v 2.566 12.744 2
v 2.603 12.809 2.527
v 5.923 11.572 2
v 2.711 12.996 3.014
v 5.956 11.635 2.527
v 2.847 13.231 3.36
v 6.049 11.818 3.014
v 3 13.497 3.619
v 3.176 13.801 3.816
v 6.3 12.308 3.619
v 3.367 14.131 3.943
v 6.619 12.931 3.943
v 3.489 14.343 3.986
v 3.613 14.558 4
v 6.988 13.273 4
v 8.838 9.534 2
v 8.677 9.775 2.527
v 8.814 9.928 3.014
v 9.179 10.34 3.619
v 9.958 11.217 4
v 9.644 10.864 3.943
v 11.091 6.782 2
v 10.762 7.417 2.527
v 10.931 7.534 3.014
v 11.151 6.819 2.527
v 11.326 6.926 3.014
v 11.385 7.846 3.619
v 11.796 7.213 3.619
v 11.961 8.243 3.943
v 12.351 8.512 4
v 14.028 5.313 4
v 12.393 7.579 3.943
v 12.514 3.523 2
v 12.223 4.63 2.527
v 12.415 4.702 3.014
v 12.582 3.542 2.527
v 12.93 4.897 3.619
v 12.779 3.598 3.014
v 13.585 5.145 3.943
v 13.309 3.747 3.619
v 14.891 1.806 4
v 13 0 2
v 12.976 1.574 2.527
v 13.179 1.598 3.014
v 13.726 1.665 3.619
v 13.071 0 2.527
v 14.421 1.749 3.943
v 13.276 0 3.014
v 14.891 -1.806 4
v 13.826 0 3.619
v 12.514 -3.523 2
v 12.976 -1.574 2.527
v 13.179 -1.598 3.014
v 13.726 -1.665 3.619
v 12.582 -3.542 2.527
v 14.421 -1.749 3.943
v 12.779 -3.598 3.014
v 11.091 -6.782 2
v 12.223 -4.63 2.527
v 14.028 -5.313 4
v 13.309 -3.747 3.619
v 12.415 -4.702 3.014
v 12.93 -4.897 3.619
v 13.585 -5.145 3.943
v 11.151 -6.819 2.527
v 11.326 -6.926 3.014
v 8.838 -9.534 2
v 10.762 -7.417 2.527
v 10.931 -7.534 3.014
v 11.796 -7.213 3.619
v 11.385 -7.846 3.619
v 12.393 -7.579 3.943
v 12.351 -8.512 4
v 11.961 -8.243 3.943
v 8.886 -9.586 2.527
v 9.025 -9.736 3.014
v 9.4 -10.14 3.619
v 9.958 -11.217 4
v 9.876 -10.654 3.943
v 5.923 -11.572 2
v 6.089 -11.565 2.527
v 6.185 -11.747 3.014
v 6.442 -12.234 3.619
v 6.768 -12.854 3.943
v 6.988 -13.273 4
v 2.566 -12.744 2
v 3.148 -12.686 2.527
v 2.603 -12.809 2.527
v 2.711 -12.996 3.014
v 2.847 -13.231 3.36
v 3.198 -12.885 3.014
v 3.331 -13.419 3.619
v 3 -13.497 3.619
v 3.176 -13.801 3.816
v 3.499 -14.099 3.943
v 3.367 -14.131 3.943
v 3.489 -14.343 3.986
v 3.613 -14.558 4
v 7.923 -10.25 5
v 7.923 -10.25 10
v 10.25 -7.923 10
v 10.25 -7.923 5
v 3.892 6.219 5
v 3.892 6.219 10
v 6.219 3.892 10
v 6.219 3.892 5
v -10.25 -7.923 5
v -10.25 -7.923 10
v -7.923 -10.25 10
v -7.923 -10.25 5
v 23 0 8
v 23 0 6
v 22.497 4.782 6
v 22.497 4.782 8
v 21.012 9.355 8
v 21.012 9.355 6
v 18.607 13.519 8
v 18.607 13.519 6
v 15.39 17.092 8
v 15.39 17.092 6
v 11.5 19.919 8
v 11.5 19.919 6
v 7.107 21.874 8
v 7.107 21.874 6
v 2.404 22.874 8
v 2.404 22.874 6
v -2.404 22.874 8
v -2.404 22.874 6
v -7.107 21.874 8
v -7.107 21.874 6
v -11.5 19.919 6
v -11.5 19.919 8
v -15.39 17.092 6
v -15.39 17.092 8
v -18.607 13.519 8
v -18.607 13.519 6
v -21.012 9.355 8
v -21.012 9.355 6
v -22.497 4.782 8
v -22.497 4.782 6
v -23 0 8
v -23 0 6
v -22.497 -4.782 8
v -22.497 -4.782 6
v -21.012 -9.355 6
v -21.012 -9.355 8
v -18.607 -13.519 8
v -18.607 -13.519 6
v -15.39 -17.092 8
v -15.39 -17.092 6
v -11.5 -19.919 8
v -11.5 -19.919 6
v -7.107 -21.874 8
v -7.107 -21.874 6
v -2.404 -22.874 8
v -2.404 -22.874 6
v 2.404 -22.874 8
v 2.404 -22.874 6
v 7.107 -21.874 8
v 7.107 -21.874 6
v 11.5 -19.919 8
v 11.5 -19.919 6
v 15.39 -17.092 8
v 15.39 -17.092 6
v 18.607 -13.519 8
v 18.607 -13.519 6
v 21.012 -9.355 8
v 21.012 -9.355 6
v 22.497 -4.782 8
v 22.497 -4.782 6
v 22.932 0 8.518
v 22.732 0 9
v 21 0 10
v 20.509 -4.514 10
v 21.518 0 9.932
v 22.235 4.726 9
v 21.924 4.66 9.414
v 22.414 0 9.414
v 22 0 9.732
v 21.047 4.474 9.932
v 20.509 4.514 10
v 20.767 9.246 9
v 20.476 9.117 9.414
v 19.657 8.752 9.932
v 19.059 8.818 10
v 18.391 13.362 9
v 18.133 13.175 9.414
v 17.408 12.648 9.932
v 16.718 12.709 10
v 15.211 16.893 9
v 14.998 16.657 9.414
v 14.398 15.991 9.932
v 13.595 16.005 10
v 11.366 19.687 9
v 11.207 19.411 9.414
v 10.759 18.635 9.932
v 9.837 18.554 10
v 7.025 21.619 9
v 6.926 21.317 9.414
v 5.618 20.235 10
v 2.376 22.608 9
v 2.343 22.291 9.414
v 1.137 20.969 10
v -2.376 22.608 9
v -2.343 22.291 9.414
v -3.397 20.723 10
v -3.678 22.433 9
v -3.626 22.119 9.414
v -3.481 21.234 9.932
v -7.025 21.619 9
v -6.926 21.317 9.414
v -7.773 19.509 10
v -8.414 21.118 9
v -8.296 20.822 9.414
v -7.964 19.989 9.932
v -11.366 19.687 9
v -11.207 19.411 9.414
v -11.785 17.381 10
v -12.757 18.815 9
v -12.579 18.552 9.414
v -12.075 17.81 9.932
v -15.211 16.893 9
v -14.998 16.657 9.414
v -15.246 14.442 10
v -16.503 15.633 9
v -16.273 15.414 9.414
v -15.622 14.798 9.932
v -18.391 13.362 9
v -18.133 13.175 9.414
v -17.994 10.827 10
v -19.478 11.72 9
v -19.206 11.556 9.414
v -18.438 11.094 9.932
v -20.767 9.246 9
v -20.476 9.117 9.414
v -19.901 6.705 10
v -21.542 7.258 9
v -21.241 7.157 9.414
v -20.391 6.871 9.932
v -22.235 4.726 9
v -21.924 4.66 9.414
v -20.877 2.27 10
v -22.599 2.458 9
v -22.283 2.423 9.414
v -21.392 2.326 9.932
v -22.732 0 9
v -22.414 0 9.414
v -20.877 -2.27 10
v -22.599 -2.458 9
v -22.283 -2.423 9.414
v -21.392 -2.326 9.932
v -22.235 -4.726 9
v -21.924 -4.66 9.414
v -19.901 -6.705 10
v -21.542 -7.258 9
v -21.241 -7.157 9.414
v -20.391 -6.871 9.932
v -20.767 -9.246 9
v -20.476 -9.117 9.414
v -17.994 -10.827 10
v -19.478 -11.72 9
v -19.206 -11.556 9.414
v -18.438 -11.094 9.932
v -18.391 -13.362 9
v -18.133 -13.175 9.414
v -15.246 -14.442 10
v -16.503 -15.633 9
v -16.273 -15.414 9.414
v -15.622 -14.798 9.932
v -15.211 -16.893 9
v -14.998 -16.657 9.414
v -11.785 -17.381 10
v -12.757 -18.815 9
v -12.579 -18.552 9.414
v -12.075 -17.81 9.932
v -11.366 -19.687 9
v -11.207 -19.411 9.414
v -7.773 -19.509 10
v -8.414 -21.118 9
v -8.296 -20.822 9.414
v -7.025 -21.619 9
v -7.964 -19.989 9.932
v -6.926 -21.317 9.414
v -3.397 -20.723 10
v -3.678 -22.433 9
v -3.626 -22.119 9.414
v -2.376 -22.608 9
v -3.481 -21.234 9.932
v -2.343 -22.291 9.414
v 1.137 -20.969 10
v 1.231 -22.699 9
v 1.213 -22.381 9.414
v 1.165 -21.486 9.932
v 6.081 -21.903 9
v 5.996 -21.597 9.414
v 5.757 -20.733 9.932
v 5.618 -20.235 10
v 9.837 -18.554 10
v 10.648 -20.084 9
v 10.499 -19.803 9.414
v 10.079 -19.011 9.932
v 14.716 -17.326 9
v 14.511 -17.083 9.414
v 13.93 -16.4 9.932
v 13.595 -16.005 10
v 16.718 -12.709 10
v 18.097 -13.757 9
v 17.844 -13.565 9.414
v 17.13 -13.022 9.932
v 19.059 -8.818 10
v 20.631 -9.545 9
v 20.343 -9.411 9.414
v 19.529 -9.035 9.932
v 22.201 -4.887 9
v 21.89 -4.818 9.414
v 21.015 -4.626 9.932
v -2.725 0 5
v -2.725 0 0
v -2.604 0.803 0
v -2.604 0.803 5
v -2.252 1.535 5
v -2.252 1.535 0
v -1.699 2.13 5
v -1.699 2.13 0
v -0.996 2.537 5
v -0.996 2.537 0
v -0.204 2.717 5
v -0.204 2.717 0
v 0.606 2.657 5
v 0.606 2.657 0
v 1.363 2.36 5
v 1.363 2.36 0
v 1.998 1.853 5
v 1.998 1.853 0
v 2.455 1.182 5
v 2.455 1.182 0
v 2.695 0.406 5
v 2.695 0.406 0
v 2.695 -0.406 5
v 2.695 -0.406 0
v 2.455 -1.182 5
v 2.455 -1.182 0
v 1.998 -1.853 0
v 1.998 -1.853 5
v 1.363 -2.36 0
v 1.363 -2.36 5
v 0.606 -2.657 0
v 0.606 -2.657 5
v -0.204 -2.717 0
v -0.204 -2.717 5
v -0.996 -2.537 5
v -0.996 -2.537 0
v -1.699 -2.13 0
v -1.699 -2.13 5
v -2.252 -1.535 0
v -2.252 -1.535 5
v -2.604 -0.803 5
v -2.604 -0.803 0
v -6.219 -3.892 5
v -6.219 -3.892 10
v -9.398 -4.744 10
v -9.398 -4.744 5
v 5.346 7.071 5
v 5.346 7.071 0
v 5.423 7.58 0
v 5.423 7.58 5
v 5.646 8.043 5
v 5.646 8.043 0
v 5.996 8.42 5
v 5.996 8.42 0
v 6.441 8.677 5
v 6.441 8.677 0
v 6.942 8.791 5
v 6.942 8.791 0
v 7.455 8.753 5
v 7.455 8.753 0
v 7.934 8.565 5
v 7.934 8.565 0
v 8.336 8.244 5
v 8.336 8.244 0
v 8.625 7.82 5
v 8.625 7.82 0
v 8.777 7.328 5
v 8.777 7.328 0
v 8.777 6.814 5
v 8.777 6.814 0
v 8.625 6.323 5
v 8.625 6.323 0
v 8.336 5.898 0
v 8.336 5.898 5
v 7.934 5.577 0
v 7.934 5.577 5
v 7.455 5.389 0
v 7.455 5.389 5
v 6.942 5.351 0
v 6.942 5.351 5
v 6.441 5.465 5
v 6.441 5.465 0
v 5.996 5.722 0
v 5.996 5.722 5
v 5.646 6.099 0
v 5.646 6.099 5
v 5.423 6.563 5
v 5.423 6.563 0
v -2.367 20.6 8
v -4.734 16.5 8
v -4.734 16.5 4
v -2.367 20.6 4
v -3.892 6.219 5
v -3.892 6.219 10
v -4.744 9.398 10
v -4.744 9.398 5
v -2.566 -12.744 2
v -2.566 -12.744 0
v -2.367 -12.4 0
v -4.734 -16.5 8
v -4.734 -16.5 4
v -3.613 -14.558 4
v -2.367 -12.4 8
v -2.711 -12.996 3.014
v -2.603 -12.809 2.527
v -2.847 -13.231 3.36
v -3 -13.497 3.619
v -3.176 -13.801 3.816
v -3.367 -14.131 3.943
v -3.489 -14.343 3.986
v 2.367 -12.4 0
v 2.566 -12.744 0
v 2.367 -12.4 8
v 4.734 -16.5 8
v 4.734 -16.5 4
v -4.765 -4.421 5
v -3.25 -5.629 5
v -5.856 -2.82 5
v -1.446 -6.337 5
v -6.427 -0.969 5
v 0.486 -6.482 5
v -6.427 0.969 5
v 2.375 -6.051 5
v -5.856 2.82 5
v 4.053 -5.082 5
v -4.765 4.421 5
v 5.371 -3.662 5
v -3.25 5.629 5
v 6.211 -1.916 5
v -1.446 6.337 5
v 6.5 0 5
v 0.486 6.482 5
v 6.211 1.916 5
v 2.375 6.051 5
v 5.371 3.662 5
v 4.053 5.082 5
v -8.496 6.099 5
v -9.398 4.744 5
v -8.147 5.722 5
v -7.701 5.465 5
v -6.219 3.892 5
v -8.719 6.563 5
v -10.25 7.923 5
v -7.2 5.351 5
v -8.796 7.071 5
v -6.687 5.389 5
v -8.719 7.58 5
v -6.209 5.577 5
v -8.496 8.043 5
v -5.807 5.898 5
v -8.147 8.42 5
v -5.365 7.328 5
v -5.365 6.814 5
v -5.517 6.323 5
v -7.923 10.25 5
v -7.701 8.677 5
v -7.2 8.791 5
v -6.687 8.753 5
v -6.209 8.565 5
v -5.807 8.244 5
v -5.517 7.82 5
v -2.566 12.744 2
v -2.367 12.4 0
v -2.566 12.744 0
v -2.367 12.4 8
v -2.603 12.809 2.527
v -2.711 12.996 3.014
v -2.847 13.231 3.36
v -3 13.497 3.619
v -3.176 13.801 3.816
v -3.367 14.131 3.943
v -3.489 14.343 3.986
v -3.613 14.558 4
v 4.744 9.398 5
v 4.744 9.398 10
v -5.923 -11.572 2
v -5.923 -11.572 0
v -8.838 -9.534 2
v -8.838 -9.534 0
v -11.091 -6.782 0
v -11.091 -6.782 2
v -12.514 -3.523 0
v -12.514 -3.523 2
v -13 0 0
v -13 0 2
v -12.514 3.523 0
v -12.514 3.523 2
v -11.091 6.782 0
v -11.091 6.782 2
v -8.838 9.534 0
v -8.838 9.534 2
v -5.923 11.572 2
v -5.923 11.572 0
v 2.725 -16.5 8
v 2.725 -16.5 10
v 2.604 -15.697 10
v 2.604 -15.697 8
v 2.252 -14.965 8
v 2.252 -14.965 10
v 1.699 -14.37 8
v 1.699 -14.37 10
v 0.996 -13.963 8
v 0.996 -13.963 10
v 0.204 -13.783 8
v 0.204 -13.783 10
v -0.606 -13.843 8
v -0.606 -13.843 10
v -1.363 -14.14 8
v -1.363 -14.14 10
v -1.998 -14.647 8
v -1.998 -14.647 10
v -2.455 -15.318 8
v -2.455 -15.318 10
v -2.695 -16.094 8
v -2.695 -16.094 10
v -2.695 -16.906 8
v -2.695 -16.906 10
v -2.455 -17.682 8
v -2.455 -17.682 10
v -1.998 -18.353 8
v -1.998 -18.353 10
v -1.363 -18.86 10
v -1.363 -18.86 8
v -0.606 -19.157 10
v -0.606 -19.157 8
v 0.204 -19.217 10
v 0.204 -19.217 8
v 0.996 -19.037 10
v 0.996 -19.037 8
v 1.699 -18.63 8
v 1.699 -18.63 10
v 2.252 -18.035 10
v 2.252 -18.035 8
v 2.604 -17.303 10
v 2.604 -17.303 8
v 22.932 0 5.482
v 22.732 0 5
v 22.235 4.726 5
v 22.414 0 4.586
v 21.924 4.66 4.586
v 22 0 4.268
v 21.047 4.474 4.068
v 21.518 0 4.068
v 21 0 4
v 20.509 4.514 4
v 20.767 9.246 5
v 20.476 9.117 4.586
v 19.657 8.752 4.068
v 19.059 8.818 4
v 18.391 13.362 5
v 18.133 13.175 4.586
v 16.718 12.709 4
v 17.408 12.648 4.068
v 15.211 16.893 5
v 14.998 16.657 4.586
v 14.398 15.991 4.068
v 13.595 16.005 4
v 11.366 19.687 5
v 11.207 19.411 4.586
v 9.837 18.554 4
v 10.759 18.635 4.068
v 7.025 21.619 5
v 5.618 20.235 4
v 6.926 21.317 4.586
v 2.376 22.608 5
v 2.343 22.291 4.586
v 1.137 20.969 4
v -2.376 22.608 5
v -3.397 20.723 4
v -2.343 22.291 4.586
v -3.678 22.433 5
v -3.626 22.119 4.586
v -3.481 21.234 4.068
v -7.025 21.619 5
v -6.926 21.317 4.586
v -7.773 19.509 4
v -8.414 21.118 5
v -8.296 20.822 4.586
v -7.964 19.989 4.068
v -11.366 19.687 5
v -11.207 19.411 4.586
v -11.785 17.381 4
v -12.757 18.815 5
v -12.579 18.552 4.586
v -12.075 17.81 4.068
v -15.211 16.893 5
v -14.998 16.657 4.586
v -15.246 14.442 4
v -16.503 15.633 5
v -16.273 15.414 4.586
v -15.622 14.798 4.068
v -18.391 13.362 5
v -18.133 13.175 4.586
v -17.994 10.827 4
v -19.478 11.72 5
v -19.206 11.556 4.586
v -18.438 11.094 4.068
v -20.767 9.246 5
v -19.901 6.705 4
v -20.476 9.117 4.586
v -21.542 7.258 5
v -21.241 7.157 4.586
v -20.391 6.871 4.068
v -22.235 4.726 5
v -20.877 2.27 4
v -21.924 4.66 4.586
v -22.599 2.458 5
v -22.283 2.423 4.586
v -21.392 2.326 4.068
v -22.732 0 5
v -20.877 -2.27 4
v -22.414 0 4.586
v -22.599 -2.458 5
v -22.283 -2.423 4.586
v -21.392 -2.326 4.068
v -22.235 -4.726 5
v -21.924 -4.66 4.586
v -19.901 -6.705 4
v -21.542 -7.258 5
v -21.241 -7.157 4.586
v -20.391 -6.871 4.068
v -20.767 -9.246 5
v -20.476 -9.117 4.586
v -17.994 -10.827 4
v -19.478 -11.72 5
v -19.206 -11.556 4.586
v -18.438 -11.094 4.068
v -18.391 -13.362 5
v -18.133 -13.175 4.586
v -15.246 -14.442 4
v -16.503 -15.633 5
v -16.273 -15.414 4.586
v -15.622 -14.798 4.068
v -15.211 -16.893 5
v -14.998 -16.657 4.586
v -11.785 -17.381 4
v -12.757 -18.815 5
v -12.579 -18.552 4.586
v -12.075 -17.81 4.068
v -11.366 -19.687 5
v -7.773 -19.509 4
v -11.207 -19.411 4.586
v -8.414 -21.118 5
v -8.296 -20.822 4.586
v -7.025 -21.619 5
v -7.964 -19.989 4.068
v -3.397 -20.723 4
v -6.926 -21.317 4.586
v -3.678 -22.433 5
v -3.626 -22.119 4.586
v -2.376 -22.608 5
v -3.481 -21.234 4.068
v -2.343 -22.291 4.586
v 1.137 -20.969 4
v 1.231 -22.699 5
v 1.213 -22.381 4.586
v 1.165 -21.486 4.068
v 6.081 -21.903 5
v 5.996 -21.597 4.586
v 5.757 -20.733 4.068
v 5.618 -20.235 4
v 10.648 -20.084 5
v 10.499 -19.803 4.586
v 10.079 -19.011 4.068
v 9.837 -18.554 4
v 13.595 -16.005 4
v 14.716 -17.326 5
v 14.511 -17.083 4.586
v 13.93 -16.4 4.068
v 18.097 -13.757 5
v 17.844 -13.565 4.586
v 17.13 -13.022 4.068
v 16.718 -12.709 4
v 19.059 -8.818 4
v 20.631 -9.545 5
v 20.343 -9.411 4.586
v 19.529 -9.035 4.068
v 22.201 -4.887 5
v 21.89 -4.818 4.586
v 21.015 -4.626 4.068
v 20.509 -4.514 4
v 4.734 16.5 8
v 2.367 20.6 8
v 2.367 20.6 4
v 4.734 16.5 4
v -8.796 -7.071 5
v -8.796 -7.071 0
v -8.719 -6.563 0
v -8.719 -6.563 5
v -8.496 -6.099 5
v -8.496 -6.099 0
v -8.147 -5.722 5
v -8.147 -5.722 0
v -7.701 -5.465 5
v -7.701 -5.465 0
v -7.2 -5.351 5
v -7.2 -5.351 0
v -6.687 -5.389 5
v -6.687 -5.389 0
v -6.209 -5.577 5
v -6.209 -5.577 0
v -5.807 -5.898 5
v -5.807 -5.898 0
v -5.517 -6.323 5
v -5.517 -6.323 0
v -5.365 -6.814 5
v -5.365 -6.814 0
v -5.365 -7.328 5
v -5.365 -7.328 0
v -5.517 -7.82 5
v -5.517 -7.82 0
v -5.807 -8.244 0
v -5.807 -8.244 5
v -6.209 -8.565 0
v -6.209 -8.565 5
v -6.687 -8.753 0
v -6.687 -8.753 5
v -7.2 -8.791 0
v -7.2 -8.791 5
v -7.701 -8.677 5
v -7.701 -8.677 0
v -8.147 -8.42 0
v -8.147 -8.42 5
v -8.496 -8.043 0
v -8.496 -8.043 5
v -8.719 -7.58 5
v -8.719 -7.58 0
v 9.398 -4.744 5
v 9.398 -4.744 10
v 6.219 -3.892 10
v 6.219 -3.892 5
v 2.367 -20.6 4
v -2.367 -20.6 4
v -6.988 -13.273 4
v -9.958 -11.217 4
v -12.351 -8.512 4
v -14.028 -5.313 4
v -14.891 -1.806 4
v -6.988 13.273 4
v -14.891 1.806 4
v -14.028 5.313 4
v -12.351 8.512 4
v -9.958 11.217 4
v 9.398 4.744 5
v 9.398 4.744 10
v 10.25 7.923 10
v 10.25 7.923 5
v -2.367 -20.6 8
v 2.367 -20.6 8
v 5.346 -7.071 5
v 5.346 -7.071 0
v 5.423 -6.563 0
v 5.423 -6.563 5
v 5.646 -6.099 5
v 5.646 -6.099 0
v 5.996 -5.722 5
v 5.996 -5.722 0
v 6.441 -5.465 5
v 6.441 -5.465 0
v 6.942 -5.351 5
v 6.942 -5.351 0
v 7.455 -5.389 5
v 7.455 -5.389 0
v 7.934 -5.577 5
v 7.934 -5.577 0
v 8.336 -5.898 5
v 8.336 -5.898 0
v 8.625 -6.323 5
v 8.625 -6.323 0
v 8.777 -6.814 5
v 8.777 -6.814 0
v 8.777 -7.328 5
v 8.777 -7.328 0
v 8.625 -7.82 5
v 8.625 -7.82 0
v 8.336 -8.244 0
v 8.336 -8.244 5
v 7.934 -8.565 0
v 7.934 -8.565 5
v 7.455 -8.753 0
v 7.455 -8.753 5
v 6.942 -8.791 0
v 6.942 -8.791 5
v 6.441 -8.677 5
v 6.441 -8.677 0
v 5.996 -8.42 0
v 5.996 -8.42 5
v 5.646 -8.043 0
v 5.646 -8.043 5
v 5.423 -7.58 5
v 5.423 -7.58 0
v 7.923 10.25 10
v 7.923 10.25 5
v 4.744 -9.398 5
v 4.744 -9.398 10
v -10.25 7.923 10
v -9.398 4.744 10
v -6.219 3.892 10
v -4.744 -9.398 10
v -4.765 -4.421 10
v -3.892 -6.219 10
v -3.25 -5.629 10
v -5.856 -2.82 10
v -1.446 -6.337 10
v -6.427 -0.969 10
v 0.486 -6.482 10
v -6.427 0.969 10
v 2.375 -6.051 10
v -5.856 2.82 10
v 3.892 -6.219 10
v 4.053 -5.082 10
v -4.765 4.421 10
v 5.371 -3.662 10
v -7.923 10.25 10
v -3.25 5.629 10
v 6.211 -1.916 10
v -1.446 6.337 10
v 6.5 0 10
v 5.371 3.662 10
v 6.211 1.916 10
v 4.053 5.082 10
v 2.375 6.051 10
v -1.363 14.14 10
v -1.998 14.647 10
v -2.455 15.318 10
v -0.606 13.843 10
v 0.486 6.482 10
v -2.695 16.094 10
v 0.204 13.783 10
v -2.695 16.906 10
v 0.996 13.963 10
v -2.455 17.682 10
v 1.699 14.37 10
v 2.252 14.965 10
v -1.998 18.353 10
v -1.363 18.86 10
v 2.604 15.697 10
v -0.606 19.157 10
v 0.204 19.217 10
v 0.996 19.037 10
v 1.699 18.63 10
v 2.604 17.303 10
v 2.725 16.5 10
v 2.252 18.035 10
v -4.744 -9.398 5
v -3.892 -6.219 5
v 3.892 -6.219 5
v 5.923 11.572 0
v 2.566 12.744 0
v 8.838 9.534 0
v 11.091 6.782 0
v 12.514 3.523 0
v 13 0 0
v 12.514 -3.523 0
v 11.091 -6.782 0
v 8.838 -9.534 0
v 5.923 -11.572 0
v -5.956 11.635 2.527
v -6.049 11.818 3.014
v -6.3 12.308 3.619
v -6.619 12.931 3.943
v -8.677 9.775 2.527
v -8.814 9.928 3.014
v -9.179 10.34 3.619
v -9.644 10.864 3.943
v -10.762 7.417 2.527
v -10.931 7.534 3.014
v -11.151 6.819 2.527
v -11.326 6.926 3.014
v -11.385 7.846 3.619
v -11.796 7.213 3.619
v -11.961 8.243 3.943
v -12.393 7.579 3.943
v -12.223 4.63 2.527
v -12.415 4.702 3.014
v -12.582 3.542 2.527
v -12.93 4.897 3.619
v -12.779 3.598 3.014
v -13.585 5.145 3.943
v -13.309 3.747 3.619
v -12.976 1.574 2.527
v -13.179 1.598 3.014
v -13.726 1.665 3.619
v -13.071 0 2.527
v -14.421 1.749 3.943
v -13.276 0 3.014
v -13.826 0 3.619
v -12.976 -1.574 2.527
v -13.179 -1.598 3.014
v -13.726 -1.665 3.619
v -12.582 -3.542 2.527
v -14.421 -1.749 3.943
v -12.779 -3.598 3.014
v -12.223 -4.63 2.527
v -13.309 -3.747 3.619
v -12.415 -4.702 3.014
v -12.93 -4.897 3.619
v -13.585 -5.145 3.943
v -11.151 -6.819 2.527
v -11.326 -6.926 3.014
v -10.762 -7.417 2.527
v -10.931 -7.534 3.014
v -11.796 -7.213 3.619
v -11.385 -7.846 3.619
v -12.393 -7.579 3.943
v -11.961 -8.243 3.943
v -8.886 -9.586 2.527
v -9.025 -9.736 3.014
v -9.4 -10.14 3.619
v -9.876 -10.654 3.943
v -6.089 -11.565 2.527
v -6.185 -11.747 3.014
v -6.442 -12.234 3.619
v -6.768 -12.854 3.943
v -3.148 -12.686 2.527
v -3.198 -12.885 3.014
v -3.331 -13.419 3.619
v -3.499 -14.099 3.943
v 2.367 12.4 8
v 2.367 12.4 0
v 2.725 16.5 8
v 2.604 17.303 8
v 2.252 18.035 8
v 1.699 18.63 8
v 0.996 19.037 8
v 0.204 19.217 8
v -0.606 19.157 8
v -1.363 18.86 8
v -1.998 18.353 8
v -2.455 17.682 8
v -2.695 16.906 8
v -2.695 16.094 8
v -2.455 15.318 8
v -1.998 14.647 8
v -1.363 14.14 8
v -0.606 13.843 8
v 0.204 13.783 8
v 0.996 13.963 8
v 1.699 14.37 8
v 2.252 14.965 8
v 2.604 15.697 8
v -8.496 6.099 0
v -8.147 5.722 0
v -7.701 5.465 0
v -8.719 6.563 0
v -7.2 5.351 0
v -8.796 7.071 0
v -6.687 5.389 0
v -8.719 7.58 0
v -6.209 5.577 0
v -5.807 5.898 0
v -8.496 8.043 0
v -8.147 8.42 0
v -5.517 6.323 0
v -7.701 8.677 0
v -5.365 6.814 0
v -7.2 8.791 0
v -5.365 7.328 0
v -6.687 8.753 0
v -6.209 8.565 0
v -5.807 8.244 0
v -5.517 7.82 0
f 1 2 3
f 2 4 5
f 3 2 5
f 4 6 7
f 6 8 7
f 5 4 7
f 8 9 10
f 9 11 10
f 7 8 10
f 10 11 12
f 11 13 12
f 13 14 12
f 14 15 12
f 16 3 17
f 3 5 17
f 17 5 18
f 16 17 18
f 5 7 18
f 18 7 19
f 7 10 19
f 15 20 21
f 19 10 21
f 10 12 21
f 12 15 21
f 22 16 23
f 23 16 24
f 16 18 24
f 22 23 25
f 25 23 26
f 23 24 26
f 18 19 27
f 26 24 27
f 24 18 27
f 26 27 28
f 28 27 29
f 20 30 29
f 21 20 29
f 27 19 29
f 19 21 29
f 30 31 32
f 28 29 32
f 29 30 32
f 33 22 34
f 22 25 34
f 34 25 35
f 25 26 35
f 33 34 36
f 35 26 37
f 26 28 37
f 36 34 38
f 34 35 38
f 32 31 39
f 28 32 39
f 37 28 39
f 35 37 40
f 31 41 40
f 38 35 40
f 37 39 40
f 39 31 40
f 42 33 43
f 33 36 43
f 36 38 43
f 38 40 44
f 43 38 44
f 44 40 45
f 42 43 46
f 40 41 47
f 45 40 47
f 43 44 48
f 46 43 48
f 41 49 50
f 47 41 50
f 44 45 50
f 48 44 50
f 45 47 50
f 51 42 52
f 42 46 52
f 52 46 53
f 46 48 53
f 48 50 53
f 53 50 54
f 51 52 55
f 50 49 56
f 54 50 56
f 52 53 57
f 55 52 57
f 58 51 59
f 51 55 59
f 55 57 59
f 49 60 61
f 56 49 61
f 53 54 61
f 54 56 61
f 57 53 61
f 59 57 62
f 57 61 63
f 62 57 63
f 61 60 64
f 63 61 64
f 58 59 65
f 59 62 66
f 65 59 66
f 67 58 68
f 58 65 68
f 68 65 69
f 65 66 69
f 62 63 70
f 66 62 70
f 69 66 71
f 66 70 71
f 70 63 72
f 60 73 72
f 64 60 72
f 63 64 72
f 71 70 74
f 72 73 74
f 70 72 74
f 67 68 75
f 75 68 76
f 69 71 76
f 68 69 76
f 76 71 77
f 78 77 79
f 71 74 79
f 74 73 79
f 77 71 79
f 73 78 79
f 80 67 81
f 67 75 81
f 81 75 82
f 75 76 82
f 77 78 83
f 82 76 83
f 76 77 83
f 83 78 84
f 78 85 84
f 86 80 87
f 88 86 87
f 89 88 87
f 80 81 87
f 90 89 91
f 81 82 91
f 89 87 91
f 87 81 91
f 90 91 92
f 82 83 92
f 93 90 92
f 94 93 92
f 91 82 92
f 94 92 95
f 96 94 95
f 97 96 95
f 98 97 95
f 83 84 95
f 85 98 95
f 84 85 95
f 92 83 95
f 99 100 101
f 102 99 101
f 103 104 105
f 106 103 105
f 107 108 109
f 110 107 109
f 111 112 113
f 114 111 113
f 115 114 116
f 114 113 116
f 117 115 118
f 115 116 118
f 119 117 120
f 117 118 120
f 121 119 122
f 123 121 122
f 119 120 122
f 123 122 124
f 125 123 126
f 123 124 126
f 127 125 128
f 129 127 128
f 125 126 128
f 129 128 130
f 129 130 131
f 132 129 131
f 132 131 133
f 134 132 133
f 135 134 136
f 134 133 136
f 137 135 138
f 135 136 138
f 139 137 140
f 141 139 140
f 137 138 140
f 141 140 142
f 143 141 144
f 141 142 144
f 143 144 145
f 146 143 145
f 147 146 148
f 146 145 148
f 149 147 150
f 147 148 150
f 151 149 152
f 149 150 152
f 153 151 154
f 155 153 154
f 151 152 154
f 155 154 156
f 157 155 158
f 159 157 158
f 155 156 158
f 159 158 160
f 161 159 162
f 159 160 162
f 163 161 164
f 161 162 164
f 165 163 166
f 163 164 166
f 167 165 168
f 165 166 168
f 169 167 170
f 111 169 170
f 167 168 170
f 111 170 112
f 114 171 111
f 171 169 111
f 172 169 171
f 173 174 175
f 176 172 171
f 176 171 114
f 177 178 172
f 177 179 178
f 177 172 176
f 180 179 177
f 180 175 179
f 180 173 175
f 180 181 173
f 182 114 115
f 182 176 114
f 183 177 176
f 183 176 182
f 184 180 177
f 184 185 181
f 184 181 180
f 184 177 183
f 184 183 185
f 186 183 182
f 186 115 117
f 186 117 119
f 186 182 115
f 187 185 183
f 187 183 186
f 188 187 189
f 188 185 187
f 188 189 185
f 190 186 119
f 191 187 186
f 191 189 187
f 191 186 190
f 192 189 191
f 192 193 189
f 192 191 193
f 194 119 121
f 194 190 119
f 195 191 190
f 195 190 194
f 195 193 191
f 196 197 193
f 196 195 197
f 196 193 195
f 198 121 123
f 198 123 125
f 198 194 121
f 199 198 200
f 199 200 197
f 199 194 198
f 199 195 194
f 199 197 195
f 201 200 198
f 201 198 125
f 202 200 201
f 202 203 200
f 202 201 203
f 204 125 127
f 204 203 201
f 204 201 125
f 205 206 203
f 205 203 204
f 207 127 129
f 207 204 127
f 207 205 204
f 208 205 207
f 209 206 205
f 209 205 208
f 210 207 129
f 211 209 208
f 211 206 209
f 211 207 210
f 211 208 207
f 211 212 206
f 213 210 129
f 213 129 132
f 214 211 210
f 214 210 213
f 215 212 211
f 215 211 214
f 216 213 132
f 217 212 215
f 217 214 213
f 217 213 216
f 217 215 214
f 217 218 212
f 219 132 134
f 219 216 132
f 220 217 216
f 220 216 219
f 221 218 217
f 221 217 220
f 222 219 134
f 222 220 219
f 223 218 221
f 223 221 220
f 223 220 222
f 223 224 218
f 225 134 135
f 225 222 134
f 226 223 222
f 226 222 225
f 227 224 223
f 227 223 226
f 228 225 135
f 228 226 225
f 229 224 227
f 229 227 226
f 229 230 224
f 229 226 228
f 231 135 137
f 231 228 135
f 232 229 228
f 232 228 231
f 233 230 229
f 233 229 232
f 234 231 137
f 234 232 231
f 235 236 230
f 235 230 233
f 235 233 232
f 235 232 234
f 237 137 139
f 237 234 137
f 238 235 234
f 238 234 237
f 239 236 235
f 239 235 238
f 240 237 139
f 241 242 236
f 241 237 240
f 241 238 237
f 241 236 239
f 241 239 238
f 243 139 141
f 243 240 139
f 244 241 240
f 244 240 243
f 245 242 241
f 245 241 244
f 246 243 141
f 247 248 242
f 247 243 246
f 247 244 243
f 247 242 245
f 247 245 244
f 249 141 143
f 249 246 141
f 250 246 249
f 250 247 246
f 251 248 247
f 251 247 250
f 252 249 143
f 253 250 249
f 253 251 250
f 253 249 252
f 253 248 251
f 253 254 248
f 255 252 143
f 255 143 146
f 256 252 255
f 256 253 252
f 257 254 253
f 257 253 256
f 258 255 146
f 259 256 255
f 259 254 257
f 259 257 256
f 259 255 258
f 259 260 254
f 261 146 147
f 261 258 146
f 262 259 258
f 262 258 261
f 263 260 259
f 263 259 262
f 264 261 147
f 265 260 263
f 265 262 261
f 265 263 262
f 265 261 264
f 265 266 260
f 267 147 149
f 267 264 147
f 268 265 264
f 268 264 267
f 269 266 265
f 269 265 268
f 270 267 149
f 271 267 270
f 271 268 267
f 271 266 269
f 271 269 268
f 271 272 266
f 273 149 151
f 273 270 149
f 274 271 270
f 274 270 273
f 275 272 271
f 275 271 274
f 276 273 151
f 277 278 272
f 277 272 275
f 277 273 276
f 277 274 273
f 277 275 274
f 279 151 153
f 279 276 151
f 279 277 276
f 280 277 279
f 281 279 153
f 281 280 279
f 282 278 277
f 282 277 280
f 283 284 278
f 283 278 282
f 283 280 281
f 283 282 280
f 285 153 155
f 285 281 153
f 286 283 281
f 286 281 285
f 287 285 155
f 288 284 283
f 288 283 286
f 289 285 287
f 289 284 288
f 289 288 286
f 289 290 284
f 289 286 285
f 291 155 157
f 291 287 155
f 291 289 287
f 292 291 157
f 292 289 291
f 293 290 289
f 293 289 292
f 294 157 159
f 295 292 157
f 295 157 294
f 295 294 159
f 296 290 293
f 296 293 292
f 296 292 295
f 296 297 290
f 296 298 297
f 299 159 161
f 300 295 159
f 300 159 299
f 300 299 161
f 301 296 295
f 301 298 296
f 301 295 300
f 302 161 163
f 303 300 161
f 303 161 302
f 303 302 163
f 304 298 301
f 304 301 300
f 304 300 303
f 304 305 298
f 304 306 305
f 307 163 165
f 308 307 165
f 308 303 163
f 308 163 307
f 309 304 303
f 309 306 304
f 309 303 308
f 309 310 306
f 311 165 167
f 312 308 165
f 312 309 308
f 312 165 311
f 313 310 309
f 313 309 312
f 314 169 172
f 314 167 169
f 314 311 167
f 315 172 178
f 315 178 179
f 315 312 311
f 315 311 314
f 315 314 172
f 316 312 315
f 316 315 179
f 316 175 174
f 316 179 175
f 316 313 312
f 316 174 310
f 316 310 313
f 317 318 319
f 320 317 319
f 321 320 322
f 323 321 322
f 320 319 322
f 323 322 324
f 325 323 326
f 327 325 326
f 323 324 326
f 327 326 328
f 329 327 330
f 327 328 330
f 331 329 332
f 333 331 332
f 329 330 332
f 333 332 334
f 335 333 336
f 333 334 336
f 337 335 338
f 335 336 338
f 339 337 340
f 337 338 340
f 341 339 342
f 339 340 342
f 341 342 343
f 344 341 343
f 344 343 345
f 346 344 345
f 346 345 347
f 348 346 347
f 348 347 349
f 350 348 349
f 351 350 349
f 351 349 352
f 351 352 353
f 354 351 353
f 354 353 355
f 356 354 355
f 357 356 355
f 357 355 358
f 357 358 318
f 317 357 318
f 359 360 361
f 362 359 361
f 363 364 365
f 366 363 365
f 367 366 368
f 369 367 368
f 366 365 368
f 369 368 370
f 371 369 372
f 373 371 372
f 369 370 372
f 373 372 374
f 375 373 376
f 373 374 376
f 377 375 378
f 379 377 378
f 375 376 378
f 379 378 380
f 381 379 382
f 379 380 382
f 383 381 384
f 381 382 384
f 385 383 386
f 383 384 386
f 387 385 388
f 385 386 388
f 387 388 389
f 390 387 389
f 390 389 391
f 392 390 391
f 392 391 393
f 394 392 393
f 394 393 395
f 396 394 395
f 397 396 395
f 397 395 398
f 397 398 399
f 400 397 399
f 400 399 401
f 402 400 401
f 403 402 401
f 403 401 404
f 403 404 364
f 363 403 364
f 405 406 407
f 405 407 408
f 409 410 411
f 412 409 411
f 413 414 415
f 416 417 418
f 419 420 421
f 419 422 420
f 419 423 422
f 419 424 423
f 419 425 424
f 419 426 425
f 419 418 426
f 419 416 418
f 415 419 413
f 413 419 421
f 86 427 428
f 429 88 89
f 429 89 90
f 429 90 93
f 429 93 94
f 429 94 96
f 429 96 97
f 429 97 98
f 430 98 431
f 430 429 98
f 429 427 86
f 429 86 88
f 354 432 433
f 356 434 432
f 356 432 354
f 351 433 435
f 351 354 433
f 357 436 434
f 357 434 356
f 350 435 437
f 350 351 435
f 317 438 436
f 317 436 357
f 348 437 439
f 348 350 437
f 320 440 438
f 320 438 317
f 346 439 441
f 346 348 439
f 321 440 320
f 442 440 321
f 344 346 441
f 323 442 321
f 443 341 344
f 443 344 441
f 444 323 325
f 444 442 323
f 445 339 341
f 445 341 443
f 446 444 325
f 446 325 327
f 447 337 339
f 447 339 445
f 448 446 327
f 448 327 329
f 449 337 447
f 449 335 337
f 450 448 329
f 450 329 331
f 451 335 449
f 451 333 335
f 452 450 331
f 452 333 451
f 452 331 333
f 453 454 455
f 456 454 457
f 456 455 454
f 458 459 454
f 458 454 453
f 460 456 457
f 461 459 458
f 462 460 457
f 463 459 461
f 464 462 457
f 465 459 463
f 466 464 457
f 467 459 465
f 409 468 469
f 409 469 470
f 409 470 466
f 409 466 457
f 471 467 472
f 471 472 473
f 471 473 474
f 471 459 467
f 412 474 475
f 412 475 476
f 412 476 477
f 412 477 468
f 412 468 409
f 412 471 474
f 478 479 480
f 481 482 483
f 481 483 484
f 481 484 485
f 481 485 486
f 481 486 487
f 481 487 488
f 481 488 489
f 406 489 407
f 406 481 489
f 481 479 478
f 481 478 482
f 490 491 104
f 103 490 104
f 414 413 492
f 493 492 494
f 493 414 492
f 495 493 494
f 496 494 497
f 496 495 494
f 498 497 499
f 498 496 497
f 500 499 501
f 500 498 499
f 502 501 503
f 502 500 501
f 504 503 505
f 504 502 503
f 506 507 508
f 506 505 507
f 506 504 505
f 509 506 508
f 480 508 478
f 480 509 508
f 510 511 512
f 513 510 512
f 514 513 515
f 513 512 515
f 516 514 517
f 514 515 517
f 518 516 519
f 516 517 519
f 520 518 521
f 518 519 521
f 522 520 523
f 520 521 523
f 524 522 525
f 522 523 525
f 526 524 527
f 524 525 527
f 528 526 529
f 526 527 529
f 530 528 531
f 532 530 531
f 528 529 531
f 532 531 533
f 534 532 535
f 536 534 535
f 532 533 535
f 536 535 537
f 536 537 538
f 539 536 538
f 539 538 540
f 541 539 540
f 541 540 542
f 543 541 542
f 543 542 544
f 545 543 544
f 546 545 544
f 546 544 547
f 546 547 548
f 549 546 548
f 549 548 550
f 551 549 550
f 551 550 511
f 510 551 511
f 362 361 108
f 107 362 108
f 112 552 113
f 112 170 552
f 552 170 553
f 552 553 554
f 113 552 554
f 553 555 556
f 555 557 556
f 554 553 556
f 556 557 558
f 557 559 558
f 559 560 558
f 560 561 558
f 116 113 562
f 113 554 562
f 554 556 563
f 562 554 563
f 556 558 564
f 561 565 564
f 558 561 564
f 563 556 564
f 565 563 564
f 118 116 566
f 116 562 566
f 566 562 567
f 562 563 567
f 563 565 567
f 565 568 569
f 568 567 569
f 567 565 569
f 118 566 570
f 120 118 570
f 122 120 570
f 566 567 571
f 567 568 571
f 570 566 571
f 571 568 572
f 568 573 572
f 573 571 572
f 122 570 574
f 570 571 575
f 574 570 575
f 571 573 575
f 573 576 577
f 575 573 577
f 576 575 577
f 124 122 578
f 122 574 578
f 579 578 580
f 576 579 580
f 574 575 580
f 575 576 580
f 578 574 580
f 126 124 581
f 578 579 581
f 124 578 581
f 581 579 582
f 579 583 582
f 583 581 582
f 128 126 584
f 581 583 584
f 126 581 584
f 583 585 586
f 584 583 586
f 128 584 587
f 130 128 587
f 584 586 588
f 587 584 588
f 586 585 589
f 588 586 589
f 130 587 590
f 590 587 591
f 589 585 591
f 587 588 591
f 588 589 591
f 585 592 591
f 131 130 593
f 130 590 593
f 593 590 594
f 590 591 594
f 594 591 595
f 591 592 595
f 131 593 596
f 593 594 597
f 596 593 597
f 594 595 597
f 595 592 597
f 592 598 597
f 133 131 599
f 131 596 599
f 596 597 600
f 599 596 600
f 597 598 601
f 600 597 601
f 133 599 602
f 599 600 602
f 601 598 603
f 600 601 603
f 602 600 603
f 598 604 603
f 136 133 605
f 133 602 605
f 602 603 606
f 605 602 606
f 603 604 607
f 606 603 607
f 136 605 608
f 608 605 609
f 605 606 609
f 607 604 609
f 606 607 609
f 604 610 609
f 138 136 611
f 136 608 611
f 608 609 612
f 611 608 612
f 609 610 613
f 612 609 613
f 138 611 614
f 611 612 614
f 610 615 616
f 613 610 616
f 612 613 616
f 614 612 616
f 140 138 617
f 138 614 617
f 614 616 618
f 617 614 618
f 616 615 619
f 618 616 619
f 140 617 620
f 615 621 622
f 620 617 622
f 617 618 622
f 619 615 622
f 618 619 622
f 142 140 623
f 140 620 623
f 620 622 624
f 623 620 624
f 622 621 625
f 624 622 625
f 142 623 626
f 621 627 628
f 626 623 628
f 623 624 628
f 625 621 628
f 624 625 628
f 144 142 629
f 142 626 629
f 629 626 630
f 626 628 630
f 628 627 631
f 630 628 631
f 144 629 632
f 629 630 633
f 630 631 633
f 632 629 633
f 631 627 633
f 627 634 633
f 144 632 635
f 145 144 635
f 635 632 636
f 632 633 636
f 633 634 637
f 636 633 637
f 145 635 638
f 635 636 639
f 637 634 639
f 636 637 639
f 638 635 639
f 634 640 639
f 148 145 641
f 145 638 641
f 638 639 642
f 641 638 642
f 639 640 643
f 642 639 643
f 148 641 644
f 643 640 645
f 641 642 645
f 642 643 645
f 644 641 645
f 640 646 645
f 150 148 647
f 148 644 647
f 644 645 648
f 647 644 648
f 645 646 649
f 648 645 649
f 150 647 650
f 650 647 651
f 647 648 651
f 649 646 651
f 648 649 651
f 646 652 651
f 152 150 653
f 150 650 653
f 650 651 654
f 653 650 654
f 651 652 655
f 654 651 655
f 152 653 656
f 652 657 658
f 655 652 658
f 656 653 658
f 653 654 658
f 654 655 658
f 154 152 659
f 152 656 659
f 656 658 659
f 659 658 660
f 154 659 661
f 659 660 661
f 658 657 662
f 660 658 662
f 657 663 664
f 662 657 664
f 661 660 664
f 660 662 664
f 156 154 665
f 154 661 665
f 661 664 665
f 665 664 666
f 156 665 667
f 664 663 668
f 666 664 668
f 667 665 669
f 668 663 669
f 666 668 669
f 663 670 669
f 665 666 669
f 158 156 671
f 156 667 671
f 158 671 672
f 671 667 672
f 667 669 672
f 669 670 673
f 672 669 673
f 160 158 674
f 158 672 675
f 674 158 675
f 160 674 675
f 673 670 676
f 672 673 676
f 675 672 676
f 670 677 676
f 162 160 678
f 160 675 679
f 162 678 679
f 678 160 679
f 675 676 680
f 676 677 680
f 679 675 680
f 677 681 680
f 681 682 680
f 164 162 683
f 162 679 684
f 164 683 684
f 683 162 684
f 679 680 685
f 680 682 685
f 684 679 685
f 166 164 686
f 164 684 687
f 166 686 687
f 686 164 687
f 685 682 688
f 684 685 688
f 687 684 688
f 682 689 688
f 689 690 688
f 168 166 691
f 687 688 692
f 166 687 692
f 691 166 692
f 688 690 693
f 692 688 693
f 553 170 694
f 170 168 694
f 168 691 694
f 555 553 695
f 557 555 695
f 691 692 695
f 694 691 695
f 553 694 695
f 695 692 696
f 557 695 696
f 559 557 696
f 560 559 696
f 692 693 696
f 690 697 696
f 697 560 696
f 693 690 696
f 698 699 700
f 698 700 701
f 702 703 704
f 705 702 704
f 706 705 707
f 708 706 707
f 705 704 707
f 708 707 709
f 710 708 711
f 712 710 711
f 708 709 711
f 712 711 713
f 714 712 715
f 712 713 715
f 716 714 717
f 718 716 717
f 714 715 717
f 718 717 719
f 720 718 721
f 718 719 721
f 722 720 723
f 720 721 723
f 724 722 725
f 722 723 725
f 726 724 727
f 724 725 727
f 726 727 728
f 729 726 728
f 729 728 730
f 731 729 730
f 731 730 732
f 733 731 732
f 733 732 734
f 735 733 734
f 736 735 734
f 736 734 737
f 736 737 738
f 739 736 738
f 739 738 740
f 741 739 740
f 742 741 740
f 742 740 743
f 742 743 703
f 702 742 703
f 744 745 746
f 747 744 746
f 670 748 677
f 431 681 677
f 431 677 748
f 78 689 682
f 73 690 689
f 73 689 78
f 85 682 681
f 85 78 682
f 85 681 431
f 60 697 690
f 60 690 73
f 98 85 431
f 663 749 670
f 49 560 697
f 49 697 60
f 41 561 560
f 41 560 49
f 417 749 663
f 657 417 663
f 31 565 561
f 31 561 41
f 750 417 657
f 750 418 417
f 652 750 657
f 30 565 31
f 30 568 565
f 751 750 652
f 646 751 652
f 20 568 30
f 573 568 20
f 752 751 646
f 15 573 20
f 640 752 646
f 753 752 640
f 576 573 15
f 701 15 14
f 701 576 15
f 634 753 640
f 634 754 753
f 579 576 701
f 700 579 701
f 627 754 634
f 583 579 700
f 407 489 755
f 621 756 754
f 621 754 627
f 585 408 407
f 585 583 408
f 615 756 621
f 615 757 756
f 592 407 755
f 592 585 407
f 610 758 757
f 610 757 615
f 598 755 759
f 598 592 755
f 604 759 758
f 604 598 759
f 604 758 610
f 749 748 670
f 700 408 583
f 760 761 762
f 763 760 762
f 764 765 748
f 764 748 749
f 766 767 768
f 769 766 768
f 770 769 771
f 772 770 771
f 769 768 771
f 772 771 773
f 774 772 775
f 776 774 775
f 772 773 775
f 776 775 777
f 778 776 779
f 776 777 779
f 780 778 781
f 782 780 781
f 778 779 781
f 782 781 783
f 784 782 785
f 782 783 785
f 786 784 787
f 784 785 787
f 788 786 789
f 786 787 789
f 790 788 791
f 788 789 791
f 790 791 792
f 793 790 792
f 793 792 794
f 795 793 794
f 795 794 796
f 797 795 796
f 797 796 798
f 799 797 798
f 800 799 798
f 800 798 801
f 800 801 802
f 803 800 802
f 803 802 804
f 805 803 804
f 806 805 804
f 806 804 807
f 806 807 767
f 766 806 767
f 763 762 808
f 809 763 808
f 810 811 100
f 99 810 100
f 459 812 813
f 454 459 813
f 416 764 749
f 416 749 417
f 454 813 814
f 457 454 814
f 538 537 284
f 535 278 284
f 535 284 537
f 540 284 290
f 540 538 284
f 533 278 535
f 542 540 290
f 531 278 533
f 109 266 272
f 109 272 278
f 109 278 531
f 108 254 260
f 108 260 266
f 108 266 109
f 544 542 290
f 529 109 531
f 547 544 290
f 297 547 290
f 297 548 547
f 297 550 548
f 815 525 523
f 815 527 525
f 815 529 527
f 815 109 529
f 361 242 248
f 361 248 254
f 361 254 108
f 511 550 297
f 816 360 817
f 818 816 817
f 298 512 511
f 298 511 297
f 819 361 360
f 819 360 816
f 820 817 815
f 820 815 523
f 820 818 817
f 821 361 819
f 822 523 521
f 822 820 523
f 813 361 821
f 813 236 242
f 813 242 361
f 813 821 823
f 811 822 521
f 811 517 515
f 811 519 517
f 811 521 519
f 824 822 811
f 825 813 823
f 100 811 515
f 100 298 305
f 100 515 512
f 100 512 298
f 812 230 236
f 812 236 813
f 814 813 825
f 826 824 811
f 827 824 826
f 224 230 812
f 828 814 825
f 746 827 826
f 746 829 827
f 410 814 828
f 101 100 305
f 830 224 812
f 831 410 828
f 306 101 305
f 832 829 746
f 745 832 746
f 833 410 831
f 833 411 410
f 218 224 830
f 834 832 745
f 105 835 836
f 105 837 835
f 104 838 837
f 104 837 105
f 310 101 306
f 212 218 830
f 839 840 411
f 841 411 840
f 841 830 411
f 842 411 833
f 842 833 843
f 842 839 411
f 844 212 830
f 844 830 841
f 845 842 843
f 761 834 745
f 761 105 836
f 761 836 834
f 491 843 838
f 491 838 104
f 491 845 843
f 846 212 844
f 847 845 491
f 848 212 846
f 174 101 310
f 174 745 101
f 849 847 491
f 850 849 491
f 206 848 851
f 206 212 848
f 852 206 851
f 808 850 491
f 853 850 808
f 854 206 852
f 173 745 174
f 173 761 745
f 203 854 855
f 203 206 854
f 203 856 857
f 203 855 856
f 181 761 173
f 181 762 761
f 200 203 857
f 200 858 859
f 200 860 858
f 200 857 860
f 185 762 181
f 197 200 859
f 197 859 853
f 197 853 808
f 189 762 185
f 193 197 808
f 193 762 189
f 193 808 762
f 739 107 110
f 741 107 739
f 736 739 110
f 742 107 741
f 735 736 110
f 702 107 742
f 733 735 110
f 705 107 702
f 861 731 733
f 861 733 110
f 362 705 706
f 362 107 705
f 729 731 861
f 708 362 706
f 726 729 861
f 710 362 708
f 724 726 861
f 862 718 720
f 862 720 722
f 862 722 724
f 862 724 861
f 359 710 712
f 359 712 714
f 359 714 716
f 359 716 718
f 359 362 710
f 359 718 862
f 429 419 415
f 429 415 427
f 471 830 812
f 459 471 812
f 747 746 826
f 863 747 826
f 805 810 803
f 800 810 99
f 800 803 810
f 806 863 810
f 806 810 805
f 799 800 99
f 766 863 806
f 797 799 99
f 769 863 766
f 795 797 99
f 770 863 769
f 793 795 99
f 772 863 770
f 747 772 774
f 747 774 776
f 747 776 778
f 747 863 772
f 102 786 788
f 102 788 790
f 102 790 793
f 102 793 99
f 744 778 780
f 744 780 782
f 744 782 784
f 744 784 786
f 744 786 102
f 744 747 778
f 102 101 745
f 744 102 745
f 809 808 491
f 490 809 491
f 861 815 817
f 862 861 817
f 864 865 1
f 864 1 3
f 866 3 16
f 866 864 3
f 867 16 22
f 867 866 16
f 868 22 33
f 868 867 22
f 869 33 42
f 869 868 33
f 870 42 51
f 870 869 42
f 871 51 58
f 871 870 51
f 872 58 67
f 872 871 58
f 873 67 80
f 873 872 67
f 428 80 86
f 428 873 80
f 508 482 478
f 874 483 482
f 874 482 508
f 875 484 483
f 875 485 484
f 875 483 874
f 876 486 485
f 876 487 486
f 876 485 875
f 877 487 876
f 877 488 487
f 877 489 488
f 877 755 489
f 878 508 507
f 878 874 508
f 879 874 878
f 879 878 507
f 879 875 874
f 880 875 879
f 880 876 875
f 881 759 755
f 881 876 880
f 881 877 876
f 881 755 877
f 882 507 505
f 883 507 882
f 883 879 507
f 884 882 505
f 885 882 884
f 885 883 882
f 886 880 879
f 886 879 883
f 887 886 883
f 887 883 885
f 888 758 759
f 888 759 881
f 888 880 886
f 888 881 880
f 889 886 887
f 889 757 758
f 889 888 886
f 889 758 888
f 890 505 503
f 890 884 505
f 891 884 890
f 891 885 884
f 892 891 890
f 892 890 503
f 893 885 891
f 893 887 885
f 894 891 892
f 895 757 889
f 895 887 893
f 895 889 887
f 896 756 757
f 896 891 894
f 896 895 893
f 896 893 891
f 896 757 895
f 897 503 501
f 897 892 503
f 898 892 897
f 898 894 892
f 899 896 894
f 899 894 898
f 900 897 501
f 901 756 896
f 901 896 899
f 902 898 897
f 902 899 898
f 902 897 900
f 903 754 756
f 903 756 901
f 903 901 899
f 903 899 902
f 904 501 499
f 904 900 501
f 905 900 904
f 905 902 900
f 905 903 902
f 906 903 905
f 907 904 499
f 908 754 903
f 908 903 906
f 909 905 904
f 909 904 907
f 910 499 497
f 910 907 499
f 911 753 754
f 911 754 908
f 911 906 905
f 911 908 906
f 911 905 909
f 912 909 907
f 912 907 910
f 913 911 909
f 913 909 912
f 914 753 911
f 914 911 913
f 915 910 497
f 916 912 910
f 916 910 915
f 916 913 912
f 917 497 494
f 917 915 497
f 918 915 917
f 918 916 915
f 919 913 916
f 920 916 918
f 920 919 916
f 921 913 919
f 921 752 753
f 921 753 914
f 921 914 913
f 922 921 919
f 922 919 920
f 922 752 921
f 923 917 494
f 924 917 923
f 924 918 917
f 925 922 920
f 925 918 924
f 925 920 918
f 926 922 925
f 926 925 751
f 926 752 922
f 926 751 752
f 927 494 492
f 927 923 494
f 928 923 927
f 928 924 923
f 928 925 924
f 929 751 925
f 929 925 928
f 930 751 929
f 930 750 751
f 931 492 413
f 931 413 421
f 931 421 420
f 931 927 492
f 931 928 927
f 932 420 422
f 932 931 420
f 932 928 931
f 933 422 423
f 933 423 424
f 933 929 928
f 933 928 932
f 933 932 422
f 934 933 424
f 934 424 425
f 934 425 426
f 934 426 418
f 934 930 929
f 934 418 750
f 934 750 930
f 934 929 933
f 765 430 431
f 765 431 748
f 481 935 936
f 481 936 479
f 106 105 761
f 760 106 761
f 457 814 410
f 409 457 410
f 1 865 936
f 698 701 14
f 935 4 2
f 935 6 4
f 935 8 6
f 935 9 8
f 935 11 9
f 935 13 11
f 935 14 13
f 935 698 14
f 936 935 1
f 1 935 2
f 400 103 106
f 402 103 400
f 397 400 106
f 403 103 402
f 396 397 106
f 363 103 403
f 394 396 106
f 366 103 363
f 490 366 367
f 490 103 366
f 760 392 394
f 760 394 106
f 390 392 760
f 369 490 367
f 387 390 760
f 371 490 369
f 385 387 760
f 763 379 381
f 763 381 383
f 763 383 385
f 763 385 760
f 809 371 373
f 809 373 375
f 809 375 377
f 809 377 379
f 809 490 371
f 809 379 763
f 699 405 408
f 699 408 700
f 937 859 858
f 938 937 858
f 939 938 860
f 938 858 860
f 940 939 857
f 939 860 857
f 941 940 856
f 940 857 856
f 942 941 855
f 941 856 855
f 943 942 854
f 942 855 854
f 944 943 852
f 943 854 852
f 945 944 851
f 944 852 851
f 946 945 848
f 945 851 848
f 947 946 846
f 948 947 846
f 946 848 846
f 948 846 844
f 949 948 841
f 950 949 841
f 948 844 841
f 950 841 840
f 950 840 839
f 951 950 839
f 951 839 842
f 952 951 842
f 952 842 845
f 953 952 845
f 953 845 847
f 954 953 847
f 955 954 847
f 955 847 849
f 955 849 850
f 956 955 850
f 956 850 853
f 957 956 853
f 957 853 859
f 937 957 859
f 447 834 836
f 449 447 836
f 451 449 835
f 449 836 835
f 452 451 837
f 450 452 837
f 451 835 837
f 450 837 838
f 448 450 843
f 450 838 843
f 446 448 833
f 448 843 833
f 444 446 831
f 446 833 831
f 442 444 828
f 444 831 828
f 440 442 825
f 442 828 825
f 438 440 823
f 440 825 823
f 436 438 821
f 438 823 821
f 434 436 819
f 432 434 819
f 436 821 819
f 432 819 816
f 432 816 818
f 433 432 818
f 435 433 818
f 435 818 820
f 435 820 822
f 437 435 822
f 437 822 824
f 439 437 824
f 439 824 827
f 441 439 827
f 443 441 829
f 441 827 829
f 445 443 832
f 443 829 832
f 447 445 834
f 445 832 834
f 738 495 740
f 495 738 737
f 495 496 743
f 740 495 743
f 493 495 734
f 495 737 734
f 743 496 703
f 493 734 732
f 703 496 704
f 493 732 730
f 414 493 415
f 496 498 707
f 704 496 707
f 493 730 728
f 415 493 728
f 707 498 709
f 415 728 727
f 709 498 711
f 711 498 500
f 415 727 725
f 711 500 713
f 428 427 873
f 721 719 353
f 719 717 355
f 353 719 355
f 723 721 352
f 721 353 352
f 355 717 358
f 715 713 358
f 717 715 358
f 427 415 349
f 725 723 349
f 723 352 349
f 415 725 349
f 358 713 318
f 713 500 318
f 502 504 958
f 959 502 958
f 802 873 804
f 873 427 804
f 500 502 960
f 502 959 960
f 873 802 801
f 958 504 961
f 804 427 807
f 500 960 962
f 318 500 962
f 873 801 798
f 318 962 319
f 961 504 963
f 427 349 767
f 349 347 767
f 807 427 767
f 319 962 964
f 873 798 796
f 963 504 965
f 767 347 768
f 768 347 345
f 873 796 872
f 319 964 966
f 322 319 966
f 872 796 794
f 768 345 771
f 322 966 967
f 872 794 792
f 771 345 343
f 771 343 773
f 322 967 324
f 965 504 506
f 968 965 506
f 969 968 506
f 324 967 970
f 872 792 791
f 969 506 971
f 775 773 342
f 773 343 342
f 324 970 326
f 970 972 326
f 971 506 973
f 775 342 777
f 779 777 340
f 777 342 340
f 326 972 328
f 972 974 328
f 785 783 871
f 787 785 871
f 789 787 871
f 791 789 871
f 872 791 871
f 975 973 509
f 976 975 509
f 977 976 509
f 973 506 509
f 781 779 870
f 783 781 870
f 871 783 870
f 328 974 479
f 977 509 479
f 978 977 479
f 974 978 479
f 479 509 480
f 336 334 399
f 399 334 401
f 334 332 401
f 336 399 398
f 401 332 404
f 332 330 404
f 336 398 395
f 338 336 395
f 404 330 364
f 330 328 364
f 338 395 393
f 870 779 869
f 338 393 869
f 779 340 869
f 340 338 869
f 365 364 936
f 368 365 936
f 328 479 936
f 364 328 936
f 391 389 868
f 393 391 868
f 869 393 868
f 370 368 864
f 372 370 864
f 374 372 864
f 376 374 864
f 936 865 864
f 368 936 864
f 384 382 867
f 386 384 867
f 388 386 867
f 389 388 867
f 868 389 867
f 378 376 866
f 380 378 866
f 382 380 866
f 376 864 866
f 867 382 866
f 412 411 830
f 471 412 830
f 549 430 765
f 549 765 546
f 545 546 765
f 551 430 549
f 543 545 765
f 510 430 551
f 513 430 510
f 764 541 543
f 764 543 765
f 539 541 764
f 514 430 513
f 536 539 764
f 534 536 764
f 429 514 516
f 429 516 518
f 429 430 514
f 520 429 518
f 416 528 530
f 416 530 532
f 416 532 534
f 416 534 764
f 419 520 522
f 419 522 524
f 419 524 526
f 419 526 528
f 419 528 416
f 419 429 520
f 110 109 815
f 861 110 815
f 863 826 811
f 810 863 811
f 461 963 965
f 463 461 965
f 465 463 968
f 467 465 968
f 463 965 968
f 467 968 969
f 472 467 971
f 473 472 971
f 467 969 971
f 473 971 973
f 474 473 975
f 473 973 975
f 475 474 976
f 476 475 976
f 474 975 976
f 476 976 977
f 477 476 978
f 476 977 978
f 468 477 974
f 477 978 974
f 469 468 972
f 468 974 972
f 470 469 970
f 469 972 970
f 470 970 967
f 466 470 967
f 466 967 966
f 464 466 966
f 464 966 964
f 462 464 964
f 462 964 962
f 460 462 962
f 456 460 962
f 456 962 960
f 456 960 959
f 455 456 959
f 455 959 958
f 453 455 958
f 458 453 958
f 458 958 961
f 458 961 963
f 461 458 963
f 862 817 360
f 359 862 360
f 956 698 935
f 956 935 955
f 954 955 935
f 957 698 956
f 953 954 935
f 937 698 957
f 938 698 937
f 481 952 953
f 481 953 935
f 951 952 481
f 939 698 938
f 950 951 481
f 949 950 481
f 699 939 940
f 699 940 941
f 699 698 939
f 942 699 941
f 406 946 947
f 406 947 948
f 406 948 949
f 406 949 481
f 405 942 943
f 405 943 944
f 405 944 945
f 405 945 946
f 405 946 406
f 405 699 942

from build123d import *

# Parameters (mm, degrees)
SKETCH1_R               = 23
BOSS_EXTRUDE3_DEPTH     = 10
SKETCH3_R               = 23
SKETCH3_R_2             = 13
CUT_EXTRUDE1_DEPTH      = 4
SKETCH4_R               = 1.725
SKETCH4_R_2             = 2.725
CUT_EXTRUDE2_DEPTH      = 35.029399054
SKETCH5_R               = 6.5
CUT_EXTRUDE3_DEPTH      = 5
SKETCH6_R               = 2.725
CUT_EXTRUDE4_DEPTH      = 35.029399054
CUT_EXTRUDE5_DEPTH      = 34.075670817
CUT_EXTRUDE5_DEPTH_BACK = 4
FILLET1_R               = 2


with BuildPart() as part:
    # Sketch1 → Boss-Extrude3 (new body)
    with BuildSketch(Plane.XY):
        Circle(SKETCH1_R)
    extrude(amount=BOSS_EXTRUDE3_DEPTH)

    # Sketch3 → Cut-Extrude1 (cut)
    with BuildSketch(Plane(origin=(0, 0, 0), x_dir=(-1, 0, 0), z_dir=(0, 0, -1))):
        Circle(SKETCH3_R)
        Circle(SKETCH3_R_2, mode=Mode.SUBTRACT)
    extrude(amount=-CUT_EXTRUDE1_DEPTH, mode=Mode.SUBTRACT)

    # Sketch4 → Cut-Extrude2 (cut, through all)
    with BuildSketch(Plane(origin=(0, 0, 0), x_dir=(-1, 0, 0), z_dir=(0, 0, -1))):
        with Locations((-7.071067812, -7.071067812)):
            Circle(SKETCH4_R)
        with Locations((7.071067812, 7.071067812)):
            Circle(SKETCH4_R)
        Circle(SKETCH4_R_2)
        with Locations((-7.071067812, 7.071067812)):
            Circle(SKETCH4_R)
        with Locations((7.071067812, -7.071067812)):
            Circle(SKETCH4_R)
    extrude(amount=-CUT_EXTRUDE2_DEPTH, mode=Mode.SUBTRACT)

    # Sketch5 → Cut-Extrude3 (cut)
    with BuildSketch(Plane.XY.offset(10)):
        Circle(SKETCH5_R)
        Polygon((-7.92281451, 10.249829766), (-10.249829766, 7.92281451), (-9.398083068, 4.744052556), (-6.219321113, 3.892305858), (-3.892305858, 6.219321113), (-4.744052556, 9.398083068), align=None)
        Polygon((9.398083068, -4.744052556), (6.219321113, -3.892305858), (3.892305858, -6.219321113), (4.744052556, -9.398083068), (7.92281451, -10.249829766), (10.249829766, -7.92281451), align=None)
        Polygon((-3.892305858, -6.219321113), (-6.219321113, -3.892305858), (-9.398083068, -4.744052556), (-10.249829766, -7.92281451), (-7.92281451, -10.249829766), (-4.744052556, -9.398083068), align=None)
        Polygon((9.398083068, 4.744052556), (10.249829766, 7.92281451), (7.92281451, 10.249829766), (4.744052556, 9.398083068), (3.892305858, 6.219321113), (6.219321113, 3.892305858), align=None)
    extrude(amount=-CUT_EXTRUDE3_DEPTH, mode=Mode.SUBTRACT)

    # Sketch6 → Cut-Extrude4 (cut, through all)
    with BuildSketch(Plane.XY.offset(10)):
        with Locations((0, 16.5)):
            Circle(SKETCH6_R)
        with Locations((0, -16.5)):
            Circle(SKETCH6_R)
    extrude(amount=-CUT_EXTRUDE4_DEPTH, mode=Mode.SUBTRACT)

    # Sketch7 → Cut-Extrude5 (cut, two sides: drawn at the far end of the back side and taken through both)
    with BuildSketch(Plane(origin=(0, 0, 4), x_dir=(-1, 0, 0), z_dir=(0, 0, -1)).offset(-CUT_EXTRUDE5_DEPTH_BACK)):
        Polygon((4.734272207, 16.5), (2.367136104, 20.6), (-2.367136104, 20.6), (-4.734272207, 16.5), (-2.367136104, 12.4), (2.367136104, 12.4), align=None)
        Polygon((4.734272207, -16.5), (2.367136104, -12.4), (-2.367136104, -12.4), (-4.734272207, -16.5), (-2.367136104, -20.6), (2.367136104, -20.6), align=None)
    extrude(amount=CUT_EXTRUDE5_DEPTH + CUT_EXTRUDE5_DEPTH_BACK, mode=Mode.SUBTRACT)

    # Fillet1
    fillet1_edges = [part.edges().sort_by_distance(p)[0] for p in [
        (13, 0, 4),
        (-13, 0, 4),
        (-23, 0, 10),
        (-23, 0, 4),
    ]]
    fillet(fillet1_edges, radius=FILLET1_R)


solid = part.part
